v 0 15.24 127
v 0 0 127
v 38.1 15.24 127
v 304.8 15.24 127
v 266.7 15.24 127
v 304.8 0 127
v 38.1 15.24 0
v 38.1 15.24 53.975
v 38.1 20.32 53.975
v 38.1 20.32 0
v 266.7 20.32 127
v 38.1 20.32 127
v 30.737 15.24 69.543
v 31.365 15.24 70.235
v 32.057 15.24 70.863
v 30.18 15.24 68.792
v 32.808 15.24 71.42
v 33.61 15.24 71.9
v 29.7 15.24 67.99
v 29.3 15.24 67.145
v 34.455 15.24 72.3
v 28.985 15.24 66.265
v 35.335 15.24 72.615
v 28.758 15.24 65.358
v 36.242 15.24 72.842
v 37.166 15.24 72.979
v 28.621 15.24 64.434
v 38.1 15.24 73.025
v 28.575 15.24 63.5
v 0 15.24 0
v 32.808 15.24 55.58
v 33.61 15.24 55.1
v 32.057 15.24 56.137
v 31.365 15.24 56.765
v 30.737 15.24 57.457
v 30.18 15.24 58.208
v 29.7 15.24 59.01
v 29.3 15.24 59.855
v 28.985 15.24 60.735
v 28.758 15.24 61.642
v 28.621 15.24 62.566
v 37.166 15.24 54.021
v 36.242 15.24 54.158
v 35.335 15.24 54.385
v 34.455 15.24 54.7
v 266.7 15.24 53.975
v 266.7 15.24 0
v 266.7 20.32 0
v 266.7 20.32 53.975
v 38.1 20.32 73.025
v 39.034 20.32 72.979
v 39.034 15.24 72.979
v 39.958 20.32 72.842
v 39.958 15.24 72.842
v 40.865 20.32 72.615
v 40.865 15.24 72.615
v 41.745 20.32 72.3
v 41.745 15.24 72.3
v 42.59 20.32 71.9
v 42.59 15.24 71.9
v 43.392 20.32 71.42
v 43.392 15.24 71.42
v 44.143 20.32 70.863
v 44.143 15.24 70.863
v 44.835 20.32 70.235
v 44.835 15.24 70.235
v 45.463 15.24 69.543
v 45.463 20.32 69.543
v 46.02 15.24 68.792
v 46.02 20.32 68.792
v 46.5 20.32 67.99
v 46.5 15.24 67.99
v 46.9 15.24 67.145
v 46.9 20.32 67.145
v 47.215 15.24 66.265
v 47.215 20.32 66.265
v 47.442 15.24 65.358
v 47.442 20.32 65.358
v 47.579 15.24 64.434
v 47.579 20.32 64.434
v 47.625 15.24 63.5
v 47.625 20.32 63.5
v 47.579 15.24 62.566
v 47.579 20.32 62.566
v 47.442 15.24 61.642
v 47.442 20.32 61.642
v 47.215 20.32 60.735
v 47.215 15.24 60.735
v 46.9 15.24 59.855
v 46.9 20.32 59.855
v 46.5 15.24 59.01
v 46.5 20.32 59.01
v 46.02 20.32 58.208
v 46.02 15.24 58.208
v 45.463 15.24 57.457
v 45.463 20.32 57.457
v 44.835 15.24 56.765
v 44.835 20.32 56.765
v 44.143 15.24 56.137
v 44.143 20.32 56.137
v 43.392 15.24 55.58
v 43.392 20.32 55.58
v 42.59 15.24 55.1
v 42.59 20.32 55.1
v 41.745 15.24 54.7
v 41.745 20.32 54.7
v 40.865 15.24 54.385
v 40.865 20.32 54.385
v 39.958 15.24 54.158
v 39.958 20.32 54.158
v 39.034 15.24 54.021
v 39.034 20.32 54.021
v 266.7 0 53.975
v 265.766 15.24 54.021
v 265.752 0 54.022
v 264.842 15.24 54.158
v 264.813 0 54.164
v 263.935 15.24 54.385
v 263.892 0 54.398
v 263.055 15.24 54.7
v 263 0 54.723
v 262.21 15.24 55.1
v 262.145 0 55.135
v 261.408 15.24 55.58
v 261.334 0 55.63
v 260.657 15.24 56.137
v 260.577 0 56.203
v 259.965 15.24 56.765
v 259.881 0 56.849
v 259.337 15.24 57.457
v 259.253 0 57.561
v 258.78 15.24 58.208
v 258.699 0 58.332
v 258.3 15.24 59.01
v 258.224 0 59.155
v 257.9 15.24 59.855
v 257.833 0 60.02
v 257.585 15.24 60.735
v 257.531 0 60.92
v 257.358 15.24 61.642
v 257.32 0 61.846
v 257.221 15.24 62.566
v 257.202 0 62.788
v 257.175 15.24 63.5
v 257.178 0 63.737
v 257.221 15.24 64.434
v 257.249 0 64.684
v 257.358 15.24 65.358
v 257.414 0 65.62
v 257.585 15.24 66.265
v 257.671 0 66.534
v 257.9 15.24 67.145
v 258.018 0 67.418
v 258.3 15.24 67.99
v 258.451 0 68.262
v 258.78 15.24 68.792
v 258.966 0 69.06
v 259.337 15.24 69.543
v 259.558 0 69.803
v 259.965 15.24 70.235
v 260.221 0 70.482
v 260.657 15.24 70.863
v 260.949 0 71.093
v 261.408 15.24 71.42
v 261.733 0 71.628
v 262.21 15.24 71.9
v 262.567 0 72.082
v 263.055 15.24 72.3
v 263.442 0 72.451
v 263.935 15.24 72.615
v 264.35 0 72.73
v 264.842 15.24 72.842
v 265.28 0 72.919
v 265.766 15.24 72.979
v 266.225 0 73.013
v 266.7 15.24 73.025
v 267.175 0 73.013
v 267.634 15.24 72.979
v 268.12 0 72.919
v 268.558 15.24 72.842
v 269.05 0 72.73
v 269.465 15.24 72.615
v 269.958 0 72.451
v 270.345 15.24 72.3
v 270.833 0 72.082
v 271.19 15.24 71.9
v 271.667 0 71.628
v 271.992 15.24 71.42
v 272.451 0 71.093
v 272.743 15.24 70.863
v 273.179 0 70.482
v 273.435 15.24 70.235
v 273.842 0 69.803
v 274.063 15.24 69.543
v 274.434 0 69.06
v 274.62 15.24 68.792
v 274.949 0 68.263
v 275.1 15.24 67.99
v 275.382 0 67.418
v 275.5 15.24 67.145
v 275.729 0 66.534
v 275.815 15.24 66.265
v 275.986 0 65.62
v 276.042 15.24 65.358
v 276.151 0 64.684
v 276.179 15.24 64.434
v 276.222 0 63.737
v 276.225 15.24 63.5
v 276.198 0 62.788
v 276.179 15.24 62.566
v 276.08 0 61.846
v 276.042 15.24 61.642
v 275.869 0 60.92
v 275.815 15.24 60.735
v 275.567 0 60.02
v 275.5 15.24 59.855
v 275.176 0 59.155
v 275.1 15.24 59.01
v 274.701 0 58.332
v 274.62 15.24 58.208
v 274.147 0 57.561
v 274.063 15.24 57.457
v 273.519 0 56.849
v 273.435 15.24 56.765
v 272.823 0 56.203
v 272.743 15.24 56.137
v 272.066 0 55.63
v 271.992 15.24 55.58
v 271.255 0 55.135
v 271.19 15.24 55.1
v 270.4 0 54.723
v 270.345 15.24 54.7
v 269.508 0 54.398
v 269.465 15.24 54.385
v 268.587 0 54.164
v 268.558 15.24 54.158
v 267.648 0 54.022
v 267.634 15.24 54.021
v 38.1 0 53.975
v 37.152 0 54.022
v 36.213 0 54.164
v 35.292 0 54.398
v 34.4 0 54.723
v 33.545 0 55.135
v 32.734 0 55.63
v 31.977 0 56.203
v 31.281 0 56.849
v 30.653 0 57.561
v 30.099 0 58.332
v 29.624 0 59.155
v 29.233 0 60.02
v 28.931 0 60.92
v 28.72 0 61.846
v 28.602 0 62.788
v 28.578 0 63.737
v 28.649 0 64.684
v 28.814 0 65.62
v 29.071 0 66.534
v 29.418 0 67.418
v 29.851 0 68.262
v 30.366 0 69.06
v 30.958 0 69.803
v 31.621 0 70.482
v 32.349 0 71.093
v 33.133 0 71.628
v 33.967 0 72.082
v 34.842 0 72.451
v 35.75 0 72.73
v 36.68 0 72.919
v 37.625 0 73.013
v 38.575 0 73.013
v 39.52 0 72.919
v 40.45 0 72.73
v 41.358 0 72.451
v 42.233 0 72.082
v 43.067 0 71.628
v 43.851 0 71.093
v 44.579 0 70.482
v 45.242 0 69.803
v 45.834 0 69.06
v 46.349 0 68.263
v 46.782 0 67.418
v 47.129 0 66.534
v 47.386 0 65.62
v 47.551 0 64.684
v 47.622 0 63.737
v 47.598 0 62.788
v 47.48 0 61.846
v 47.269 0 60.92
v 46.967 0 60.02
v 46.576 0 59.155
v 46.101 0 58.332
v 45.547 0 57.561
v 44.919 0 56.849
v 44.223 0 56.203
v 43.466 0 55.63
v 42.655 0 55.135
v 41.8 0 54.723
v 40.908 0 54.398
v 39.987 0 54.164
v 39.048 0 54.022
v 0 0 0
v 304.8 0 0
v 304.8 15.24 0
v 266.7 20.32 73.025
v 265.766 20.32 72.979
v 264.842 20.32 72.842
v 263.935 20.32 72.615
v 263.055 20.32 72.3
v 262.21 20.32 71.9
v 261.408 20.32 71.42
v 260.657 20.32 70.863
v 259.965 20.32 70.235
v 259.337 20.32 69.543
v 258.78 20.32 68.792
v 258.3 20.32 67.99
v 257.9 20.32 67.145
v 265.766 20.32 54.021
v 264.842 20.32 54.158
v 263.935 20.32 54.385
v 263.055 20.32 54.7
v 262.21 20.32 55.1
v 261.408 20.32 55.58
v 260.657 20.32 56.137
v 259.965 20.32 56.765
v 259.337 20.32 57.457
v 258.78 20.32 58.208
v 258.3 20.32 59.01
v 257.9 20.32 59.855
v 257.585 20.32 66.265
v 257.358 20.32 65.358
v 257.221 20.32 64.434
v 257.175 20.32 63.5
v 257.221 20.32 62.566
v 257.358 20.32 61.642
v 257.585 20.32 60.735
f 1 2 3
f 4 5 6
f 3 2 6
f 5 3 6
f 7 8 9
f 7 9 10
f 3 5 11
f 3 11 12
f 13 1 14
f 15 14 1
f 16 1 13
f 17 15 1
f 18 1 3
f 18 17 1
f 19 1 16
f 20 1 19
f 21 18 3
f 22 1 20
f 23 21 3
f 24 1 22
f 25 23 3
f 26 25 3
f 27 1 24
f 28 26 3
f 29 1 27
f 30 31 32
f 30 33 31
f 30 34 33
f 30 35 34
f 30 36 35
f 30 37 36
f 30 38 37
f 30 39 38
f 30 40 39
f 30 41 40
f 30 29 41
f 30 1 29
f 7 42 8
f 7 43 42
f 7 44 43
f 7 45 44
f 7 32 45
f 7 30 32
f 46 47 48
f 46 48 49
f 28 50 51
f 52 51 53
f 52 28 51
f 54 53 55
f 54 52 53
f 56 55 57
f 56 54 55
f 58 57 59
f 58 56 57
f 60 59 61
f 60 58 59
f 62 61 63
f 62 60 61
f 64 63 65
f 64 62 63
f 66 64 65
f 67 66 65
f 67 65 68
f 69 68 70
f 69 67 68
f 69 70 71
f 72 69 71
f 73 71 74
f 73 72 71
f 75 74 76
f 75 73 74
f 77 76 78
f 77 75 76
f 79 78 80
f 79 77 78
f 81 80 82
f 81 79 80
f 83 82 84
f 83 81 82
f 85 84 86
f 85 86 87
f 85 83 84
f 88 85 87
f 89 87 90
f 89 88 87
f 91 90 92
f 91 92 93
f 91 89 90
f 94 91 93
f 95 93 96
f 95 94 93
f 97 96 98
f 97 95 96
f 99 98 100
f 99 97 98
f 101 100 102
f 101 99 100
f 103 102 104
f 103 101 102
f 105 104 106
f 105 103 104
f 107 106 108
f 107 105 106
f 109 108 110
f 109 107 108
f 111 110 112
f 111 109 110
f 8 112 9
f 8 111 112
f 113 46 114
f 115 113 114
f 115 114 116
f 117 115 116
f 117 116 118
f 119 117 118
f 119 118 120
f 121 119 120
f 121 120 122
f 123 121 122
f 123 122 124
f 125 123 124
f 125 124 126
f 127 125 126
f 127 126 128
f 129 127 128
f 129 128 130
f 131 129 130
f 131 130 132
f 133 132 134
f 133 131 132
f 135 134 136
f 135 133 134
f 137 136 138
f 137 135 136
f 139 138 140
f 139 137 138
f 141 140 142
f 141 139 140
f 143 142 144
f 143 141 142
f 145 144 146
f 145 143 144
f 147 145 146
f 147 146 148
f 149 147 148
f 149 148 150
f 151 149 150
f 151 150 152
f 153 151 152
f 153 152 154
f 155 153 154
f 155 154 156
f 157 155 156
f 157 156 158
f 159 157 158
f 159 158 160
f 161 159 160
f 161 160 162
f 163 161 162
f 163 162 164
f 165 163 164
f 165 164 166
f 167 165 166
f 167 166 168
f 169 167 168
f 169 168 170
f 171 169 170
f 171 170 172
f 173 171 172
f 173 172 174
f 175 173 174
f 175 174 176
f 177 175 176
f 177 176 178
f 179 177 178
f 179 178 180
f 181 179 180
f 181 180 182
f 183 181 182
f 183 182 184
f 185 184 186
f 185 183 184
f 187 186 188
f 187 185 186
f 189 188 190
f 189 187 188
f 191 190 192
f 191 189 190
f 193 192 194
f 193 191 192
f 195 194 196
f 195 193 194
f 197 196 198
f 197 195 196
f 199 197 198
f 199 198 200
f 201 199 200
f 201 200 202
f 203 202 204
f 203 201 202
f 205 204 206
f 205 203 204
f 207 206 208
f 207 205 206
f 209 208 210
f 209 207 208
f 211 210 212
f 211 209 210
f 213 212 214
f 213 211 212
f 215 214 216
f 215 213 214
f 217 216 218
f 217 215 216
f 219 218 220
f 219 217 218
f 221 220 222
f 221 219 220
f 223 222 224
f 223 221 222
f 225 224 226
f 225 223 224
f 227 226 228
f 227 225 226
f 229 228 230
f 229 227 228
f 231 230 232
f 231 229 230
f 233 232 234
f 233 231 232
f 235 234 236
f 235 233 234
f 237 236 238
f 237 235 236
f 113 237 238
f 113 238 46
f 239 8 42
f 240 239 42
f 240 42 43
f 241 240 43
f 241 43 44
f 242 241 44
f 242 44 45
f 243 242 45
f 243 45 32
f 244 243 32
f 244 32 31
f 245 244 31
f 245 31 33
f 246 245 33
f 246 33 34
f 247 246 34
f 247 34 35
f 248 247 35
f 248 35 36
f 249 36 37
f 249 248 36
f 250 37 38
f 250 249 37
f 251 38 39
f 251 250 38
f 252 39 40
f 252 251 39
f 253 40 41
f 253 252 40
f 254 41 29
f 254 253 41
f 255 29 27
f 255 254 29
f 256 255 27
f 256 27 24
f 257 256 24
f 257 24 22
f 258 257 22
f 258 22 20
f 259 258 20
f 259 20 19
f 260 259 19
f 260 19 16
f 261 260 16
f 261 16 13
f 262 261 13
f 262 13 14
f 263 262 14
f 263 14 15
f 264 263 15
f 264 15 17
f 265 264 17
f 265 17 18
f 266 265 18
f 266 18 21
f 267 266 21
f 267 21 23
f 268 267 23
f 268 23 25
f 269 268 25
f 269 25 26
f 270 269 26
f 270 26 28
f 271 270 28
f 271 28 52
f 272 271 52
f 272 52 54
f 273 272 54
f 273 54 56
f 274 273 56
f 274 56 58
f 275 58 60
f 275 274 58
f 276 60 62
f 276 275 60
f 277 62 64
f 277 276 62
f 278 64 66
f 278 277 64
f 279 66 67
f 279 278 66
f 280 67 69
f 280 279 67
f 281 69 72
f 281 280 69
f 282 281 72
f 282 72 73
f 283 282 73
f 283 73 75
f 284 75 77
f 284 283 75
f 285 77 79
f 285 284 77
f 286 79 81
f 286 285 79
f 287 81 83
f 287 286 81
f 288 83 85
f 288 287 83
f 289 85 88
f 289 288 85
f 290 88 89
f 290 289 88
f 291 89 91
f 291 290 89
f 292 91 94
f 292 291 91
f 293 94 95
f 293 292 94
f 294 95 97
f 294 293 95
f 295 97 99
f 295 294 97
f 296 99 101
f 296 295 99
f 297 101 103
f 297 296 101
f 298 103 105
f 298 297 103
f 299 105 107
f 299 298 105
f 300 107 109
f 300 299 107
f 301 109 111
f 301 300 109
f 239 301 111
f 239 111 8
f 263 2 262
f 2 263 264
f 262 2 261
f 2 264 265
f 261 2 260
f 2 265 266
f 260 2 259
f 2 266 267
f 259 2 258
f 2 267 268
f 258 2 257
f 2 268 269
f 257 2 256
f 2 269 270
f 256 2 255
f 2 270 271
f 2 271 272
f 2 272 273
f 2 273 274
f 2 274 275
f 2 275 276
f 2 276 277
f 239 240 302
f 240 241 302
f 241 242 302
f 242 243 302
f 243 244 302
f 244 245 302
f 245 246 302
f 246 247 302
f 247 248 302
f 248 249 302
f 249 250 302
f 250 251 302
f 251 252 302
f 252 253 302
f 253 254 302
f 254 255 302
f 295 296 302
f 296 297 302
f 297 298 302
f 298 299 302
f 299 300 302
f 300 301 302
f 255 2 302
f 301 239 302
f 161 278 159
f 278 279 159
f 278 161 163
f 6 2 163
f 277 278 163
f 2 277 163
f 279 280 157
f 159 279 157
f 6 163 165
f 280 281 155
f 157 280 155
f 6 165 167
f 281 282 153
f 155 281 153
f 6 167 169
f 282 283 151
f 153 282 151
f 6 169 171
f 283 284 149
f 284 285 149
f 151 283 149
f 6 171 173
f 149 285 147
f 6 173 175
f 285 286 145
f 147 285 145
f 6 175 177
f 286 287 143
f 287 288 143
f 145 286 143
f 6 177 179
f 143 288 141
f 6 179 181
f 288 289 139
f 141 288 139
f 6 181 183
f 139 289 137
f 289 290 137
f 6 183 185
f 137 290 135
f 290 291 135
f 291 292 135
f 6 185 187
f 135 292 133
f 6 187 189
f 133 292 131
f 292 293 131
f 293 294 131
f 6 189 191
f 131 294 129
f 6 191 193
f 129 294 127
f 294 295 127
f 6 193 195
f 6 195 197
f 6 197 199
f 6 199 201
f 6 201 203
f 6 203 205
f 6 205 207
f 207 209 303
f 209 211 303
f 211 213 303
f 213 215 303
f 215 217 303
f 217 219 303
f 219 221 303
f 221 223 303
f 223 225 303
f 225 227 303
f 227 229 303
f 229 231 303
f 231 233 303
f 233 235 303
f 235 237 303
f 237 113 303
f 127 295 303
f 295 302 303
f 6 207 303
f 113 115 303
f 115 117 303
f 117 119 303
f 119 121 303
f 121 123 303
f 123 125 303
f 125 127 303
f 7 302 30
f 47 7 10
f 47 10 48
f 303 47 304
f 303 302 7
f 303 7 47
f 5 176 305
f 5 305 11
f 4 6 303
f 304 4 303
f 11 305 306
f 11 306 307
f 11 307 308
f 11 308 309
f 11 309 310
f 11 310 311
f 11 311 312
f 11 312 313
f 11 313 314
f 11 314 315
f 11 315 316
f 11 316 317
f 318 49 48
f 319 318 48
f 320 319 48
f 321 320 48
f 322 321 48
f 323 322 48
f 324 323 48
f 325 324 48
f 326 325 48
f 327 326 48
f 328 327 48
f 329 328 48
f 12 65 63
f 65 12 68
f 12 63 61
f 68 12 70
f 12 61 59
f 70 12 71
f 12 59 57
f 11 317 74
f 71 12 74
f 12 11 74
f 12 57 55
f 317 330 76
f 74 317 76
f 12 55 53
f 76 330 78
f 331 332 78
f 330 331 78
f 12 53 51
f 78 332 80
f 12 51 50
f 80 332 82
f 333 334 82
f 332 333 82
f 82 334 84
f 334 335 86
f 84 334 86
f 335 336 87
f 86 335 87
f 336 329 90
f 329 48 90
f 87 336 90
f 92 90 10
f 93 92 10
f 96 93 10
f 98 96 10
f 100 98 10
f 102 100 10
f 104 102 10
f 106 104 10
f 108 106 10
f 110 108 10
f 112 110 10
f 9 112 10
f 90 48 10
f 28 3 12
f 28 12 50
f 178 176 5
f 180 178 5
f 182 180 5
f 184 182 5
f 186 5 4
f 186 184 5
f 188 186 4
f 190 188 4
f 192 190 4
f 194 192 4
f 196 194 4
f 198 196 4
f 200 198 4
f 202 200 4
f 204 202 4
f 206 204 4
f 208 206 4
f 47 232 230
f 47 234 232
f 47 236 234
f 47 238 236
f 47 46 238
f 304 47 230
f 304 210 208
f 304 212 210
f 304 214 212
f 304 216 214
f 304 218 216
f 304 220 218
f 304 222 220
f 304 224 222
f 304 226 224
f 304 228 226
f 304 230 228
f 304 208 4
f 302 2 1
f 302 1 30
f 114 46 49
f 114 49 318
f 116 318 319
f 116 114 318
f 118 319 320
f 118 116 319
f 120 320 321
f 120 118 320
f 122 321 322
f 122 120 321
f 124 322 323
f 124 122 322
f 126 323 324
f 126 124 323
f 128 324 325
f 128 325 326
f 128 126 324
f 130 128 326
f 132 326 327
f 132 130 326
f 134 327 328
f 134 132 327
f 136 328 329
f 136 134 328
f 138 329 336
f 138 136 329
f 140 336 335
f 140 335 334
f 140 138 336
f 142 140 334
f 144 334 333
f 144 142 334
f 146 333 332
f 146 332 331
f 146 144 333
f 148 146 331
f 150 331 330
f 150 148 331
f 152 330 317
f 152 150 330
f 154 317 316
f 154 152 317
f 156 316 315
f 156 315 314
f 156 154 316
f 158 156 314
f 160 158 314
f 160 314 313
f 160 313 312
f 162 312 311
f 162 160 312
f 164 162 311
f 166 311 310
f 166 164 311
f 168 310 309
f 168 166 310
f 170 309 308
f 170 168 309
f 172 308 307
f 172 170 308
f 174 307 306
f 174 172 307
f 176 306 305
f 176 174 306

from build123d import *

# Parameters (mm, degrees)
SKETCH2_W           = 304.8
SKETCH2_H           = 127
SKETCH2_R           = 9.525
BOSS_EXTRUDE1_DEPTH = 15.24
BOSS_EXTRUDE2_DEPTH = 5.08


with BuildPart() as part:
    # Sketch2 → Boss-Extrude1 (new body)
    with BuildSketch(Plane(origin=(0, 0, 0), x_dir=(1, 0, 0), z_dir=(0, 1, 0))):
        with Locations((152.4, -63.5)):
            Rectangle(SKETCH2_W, SKETCH2_H)
        with Locations(Location((38.1, -63.5, 0), (0, 0, 90))):
            Circle(SKETCH2_R, mode=Mode.SUBTRACT)
        with Locations(Location((266.7, -63.5, 0), (0, 0, 90))):
            Circle(SKETCH2_R, mode=Mode.SUBTRACT)
    extrude(amount=BOSS_EXTRUDE1_DEPTH)

    # Sketch3 → Boss-Extrude2 (add)
    with BuildSketch(Plane(origin=(0, 15.24, 0), x_dir=(1, 0, 0), z_dir=(0, 1, 0))):
        with BuildLine():
            Line((38.1, 0), (266.7, 0))
            Line((266.7, 0), (266.7, -53.975))
            ThreePointArc((266.7, -53.975), (257.175, -63.5), (266.7, -73.025))
            Line((266.7, -73.025), (266.7, -127))
            Line((266.7, -127), (38.1, -127))
            Line((38.1, -127), (38.1, -73.025))
            ThreePointArc((38.1, -73.025), (47.625, -63.5), (38.1, -53.975))
            Line((38.1, -53.975), (38.1, 0))
        make_face()
    extrude(amount=BOSS_EXTRUDE2_DEPTH)


solid = part.part
